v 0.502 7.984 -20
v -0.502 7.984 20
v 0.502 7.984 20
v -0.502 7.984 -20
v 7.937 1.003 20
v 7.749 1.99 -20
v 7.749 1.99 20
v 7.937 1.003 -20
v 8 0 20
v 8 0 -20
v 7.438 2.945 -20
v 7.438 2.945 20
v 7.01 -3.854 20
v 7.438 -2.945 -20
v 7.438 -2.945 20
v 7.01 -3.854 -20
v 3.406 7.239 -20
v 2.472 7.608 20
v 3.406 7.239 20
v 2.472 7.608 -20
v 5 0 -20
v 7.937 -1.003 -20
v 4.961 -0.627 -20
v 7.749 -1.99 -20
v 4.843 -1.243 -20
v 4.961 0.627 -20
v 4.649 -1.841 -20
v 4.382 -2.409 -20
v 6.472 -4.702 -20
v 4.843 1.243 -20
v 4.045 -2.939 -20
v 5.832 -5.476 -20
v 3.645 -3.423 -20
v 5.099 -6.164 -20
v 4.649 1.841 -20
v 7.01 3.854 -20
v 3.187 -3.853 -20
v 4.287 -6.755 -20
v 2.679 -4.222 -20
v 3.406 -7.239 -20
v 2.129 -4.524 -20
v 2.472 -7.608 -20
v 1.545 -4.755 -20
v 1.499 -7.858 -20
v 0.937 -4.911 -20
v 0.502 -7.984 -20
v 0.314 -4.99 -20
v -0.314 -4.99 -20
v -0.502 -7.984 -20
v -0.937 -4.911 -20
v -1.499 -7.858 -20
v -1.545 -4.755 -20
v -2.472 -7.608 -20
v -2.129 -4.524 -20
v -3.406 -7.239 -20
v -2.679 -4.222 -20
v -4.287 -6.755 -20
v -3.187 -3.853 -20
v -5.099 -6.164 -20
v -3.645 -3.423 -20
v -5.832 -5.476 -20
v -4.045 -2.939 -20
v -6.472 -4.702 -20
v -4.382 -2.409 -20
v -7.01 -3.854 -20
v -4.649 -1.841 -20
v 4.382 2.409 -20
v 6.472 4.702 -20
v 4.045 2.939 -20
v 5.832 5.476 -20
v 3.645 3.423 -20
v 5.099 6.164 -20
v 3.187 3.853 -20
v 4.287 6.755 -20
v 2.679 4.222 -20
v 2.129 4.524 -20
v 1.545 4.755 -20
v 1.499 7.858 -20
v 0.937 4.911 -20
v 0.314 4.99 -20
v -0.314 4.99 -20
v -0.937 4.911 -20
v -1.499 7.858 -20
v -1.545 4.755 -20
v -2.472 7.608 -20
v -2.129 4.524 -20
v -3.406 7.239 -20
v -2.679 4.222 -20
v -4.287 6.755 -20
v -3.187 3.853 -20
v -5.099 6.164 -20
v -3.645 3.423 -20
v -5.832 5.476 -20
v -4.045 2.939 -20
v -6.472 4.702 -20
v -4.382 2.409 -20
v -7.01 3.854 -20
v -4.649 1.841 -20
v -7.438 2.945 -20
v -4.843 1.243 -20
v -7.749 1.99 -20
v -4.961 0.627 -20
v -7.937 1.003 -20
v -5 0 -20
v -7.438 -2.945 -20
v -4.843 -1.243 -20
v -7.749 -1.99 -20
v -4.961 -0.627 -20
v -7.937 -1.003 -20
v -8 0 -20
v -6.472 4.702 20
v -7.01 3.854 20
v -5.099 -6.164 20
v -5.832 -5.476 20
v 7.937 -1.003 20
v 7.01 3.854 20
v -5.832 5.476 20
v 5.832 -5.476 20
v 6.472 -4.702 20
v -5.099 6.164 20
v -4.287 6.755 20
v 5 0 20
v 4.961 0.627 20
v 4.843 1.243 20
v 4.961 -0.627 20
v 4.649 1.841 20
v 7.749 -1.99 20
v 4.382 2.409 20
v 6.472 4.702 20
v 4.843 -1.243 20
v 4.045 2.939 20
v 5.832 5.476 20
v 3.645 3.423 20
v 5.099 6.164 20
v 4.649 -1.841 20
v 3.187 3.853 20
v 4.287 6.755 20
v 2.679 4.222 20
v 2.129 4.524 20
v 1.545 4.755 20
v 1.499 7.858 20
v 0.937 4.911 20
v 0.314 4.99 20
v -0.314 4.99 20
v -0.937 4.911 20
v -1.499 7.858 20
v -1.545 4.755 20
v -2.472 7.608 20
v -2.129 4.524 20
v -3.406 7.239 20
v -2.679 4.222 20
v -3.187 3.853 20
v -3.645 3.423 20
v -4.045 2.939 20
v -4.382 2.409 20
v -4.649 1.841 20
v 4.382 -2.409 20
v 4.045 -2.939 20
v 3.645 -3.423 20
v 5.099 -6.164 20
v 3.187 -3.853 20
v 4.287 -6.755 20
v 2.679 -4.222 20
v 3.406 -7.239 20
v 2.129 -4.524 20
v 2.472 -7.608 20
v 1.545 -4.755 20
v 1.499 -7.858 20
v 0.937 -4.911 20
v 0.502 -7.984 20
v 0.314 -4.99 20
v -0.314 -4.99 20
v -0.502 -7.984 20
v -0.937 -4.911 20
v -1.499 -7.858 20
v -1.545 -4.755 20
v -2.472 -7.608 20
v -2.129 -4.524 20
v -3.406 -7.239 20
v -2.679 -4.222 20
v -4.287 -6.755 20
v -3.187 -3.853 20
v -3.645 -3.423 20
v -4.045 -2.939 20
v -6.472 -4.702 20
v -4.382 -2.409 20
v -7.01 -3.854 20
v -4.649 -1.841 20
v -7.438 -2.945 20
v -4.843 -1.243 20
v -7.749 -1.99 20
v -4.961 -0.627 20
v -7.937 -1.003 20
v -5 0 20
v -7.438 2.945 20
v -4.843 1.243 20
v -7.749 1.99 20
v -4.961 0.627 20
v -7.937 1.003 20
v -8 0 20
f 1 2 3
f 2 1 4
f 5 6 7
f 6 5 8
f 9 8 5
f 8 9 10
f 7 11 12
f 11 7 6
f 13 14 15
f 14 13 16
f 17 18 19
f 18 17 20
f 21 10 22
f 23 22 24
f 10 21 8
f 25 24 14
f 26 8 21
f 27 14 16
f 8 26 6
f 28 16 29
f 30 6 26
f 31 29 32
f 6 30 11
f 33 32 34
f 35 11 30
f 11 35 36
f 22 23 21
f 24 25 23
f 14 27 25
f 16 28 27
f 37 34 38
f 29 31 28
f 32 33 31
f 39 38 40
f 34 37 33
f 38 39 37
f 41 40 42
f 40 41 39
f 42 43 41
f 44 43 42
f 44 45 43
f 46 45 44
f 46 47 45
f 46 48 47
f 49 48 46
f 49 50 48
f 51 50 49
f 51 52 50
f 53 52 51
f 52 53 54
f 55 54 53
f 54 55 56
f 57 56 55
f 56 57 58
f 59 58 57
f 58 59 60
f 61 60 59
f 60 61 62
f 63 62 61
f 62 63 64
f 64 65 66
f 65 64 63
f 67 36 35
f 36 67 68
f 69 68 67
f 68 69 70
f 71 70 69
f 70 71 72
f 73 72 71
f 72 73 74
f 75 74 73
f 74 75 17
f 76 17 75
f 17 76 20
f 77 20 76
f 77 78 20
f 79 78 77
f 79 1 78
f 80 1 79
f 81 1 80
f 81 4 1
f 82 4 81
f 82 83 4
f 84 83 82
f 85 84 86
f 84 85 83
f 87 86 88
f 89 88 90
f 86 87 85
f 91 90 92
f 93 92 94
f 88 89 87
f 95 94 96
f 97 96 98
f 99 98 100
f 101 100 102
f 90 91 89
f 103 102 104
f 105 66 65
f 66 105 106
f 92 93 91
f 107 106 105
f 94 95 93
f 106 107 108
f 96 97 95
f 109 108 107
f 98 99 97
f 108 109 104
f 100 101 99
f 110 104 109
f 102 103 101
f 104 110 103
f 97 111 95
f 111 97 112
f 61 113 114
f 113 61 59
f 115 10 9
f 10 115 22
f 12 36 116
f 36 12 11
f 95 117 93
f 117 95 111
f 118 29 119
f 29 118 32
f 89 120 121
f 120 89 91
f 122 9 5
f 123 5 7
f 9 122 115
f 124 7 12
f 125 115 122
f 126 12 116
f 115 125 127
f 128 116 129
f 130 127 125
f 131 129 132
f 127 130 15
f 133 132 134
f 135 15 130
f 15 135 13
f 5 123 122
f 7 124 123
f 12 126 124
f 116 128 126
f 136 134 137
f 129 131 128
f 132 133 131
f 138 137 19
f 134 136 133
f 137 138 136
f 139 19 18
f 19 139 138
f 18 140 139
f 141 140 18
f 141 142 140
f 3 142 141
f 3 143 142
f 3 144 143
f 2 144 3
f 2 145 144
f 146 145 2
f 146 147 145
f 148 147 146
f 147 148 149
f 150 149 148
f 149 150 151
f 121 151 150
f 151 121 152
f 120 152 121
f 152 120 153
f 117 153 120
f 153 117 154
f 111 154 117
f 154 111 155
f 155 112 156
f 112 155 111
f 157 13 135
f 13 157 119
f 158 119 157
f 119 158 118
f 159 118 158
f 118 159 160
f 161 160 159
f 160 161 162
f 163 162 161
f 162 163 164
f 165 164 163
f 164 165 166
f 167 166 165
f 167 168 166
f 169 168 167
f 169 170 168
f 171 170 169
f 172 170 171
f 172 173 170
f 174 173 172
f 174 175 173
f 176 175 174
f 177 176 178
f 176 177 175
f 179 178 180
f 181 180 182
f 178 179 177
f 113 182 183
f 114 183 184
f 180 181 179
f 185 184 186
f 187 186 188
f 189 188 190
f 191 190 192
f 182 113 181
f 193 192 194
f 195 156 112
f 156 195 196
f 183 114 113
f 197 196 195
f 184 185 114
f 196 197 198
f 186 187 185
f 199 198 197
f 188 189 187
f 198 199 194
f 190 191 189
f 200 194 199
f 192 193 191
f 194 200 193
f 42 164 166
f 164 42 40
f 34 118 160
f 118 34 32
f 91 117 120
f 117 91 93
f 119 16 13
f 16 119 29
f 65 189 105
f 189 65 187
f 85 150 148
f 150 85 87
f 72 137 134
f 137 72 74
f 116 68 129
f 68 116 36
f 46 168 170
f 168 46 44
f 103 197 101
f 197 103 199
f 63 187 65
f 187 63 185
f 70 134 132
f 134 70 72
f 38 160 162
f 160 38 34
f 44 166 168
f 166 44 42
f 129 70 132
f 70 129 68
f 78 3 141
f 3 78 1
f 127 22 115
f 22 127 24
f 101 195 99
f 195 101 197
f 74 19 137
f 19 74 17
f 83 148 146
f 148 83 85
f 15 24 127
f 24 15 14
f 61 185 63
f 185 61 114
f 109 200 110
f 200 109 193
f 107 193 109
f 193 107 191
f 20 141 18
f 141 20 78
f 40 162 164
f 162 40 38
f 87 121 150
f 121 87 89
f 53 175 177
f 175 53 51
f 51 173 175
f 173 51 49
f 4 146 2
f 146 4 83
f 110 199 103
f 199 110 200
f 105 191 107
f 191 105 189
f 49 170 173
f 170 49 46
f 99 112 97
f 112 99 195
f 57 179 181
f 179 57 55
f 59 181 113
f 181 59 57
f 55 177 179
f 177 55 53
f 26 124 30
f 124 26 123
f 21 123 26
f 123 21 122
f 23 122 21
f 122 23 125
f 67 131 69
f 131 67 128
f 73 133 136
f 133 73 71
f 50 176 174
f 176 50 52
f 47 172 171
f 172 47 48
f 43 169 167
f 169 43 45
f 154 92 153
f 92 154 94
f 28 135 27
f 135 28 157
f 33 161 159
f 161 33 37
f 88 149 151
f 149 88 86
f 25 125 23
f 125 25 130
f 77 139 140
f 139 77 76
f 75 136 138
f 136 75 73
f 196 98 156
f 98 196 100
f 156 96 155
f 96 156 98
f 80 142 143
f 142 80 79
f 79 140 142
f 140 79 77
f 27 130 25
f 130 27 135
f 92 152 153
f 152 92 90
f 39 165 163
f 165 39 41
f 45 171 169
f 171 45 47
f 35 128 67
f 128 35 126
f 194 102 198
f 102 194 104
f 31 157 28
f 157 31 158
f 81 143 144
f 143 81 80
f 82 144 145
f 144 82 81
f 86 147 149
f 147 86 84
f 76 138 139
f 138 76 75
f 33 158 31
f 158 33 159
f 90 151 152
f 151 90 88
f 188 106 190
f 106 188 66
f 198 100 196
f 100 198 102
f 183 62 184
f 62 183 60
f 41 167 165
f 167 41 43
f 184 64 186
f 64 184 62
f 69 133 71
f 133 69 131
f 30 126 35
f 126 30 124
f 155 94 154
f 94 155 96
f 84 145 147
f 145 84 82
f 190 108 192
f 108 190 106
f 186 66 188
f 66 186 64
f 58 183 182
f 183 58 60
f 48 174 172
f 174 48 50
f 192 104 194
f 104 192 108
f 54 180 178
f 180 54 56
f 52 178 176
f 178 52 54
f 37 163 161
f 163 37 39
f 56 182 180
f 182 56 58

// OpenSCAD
$fn = 50;


difference() {
	union() {
		translate(v = [0, 0, -20.0000000000]) {
			cylinder(h = 40, r = 8.0000000000);
		}
	}
	union() {
		translate(v = [0, 0, -100.0000000000]) {
			cylinder(h = 200, r = 5.0000000000);
		}
	}
}
